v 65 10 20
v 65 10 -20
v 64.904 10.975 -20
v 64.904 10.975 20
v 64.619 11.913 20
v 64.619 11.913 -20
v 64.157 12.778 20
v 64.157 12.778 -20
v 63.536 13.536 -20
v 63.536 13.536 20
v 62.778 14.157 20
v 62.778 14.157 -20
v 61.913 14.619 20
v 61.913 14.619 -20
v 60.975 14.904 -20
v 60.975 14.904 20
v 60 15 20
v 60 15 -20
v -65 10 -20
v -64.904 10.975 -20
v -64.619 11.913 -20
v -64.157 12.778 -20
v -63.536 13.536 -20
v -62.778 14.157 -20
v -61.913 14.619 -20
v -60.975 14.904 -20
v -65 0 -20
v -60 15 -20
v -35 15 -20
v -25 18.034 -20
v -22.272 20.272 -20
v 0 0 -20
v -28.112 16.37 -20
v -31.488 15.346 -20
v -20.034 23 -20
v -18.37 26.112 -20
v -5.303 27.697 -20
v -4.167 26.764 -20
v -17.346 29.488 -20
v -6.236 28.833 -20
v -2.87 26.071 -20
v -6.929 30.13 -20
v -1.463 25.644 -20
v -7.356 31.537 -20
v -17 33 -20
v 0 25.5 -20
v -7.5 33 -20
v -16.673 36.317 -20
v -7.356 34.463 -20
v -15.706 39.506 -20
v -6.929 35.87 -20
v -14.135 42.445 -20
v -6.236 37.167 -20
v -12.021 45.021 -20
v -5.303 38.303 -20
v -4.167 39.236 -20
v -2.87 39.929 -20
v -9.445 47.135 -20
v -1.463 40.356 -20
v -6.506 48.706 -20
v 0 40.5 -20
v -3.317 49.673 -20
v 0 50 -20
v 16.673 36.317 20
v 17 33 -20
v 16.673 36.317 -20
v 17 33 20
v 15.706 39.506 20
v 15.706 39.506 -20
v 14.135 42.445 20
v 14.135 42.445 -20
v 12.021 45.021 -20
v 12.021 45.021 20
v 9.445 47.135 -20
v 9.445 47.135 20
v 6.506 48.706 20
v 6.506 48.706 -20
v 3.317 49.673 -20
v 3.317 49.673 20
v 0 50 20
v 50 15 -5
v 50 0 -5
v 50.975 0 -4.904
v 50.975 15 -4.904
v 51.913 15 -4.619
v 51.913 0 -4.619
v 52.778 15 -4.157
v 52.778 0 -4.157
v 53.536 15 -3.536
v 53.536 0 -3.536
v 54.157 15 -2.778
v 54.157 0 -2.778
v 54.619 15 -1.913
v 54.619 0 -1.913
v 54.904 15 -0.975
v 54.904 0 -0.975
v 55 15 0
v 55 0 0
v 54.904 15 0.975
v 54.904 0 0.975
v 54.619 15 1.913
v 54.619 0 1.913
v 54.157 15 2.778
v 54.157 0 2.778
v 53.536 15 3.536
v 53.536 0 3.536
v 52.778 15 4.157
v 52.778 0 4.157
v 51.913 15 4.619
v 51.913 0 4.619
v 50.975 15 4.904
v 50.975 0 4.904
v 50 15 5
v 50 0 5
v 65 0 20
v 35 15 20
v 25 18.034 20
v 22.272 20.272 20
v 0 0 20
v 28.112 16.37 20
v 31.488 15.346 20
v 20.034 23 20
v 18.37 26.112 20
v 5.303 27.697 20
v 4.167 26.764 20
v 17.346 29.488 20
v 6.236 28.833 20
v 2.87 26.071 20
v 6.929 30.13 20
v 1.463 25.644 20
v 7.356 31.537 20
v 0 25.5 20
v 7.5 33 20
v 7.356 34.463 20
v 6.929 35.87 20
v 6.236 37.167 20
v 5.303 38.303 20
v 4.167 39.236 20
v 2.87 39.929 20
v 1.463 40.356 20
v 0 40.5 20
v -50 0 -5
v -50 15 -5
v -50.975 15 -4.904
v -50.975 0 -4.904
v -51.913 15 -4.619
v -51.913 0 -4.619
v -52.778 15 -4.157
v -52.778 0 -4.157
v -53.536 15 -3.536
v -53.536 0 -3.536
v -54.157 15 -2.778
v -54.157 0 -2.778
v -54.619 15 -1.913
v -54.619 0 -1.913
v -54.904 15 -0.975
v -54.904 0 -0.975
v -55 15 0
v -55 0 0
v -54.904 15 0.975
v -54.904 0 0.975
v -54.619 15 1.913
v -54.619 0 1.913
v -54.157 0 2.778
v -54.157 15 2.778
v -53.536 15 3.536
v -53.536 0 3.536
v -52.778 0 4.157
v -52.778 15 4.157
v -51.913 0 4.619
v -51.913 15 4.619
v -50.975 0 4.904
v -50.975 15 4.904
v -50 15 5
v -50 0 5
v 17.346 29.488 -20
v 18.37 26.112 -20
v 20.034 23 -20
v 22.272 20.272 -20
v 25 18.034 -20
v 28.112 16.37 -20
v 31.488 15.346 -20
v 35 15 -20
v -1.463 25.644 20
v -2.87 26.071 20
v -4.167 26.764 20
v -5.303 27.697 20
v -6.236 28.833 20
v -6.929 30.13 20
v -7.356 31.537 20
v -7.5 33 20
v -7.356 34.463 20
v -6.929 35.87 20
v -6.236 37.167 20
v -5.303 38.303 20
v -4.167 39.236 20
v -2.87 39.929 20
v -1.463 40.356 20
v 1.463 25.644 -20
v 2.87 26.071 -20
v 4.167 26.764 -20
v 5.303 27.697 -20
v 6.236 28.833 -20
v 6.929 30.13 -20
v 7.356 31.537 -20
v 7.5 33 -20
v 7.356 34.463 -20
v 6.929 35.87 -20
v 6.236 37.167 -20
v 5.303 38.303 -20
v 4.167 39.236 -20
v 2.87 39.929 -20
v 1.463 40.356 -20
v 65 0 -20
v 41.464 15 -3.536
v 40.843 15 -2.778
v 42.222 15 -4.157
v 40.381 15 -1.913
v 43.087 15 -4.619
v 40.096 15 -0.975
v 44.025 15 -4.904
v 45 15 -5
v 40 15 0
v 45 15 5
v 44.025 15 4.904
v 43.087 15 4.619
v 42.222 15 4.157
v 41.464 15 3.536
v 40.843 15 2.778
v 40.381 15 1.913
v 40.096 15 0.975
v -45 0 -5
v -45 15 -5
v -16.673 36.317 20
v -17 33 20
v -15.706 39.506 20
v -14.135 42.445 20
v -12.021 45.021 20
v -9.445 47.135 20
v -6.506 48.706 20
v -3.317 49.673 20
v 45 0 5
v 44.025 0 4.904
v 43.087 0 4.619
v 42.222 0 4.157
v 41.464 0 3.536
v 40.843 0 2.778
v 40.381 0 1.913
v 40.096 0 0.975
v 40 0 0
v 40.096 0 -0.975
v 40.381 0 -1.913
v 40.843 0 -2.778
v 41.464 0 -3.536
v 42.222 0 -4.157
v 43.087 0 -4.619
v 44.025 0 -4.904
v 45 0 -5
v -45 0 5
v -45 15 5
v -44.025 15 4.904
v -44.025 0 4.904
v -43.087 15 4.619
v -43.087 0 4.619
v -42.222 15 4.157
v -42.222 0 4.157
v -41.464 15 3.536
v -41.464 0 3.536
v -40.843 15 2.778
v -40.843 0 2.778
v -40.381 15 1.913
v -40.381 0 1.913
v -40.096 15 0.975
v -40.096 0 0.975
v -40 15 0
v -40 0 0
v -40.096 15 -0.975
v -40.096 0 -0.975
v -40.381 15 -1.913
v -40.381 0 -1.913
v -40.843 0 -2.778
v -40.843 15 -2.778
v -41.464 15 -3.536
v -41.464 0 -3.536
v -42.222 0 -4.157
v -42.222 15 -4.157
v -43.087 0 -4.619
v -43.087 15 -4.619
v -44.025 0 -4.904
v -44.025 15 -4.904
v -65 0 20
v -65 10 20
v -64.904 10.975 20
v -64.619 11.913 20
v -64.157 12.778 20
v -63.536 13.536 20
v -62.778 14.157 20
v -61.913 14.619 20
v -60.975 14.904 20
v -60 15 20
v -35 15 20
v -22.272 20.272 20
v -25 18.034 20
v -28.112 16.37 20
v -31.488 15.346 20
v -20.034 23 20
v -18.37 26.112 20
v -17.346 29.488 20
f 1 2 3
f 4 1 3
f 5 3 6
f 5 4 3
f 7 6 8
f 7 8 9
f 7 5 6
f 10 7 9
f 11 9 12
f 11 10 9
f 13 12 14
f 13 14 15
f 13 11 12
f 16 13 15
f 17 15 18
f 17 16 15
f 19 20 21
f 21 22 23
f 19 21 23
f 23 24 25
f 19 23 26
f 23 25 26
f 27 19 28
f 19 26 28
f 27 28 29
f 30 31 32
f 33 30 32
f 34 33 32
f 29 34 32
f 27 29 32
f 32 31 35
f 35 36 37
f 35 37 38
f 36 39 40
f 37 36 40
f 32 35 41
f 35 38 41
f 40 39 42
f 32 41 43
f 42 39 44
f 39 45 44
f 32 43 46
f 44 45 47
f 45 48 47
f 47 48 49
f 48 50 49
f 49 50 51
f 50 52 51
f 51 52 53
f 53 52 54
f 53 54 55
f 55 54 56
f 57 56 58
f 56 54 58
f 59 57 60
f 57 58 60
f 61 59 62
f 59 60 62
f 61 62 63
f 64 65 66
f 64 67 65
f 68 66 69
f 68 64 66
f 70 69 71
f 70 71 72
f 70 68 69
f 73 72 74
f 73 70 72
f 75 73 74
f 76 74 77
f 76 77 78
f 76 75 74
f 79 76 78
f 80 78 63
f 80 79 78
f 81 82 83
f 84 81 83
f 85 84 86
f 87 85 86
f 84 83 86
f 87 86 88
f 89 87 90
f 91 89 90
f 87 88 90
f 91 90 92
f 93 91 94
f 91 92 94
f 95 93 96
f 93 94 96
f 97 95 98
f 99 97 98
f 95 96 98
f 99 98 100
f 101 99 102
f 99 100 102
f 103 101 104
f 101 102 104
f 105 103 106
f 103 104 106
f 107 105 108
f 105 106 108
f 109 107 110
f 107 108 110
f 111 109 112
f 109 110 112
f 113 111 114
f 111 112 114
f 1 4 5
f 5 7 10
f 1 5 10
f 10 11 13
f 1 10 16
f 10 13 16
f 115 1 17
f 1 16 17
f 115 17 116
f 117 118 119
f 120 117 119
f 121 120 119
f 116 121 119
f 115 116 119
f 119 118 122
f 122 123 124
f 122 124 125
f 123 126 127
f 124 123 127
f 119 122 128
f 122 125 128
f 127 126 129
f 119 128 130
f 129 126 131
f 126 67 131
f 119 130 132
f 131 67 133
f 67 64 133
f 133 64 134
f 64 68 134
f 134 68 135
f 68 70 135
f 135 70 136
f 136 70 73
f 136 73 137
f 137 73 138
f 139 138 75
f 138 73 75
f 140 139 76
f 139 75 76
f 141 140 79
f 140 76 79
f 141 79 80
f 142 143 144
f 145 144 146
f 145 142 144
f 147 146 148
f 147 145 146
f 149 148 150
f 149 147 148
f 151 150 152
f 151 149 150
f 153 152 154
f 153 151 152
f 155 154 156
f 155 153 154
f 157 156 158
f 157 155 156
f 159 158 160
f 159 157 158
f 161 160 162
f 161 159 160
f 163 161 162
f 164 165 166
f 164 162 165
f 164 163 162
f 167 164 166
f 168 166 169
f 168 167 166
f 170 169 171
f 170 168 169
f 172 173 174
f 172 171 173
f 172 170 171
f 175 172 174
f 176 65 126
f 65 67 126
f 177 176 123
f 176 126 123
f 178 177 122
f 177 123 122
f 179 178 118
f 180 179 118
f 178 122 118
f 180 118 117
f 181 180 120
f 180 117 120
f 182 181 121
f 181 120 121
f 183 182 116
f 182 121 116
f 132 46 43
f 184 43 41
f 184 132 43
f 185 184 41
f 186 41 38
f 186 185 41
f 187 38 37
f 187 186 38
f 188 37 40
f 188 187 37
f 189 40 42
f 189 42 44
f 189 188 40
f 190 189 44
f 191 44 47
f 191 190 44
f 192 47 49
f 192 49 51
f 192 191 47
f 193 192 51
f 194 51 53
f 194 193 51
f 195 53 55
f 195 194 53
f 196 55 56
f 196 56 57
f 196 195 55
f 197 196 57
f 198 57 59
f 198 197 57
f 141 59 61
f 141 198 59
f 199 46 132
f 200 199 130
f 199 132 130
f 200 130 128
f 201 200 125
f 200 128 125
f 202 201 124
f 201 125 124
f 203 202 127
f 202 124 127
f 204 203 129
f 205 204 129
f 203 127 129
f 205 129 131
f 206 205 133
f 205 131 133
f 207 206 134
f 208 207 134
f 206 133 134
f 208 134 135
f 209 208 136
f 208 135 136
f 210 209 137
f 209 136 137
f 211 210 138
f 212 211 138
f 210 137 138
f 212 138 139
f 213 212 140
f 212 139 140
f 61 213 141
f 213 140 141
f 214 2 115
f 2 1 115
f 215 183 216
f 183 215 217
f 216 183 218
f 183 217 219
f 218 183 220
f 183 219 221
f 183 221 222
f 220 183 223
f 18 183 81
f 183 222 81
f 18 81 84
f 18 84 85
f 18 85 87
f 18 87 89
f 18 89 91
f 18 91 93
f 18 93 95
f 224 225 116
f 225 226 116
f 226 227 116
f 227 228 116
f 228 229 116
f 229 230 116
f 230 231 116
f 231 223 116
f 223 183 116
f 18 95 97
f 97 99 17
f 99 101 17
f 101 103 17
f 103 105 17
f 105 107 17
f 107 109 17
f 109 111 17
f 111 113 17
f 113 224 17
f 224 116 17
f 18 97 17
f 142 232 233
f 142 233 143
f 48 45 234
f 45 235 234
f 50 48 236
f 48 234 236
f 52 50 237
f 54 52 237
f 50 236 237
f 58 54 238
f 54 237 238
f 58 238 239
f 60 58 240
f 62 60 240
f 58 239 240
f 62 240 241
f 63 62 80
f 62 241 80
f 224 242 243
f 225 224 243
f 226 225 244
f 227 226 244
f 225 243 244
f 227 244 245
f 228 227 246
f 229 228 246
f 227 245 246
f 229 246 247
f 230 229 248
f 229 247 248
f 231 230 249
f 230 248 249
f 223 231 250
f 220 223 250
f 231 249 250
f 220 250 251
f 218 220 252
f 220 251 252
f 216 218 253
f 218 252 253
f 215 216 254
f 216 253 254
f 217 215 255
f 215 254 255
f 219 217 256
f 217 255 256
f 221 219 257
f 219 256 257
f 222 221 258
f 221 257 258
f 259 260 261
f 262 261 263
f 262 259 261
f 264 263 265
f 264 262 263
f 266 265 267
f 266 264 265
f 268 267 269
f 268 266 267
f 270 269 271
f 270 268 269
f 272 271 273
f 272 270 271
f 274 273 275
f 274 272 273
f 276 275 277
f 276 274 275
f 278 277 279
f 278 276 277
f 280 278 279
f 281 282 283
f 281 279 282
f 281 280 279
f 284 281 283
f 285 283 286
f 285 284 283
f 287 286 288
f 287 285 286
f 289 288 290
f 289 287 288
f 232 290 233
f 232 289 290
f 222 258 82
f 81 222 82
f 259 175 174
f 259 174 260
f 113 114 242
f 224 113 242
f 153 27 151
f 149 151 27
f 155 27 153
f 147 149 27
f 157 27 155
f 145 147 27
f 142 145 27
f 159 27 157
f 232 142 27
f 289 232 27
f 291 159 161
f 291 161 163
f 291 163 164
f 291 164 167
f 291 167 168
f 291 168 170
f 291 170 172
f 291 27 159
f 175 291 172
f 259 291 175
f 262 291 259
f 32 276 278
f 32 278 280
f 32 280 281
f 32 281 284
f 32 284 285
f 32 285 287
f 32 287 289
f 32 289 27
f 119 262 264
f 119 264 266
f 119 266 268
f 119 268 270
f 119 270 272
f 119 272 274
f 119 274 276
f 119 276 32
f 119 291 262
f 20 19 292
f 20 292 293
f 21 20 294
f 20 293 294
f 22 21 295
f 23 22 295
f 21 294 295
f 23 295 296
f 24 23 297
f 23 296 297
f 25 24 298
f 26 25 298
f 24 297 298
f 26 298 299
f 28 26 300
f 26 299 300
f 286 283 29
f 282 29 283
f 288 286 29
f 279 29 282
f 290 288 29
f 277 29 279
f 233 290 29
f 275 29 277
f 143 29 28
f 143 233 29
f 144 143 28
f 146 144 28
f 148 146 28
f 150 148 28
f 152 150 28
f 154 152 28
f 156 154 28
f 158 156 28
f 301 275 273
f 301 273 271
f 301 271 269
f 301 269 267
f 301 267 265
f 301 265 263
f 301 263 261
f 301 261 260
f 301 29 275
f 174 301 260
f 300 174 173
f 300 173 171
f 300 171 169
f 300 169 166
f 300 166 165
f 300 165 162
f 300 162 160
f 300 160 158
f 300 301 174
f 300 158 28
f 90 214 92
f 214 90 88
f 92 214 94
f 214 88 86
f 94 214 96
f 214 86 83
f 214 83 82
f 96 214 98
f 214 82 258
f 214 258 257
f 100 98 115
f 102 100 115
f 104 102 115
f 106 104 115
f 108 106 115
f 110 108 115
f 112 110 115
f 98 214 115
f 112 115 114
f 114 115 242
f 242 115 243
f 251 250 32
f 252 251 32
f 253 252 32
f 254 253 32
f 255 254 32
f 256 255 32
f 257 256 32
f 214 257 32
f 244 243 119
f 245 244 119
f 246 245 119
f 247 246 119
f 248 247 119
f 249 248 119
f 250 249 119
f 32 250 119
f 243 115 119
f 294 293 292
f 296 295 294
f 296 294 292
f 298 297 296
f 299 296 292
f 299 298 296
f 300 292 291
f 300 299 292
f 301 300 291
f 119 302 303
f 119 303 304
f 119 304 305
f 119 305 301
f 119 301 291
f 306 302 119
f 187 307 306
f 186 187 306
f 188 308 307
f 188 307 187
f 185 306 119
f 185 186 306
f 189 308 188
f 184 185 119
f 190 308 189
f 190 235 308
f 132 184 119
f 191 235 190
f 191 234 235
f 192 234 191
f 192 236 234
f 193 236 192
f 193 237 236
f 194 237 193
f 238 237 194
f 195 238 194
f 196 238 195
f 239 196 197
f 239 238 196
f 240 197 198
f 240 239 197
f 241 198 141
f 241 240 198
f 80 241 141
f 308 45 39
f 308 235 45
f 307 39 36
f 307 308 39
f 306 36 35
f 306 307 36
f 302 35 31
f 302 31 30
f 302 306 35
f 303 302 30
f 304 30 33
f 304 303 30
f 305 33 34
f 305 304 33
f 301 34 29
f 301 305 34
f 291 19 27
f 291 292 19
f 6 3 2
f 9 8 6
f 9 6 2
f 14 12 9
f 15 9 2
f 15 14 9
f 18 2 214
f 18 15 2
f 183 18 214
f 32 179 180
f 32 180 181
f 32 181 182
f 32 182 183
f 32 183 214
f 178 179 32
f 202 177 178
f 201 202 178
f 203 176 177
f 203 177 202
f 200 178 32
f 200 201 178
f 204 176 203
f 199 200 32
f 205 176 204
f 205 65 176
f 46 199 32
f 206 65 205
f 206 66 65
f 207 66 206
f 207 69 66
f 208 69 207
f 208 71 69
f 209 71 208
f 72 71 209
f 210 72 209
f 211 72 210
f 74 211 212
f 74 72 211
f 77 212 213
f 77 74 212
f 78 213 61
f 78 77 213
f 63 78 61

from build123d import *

# Parameters (mm, degrees)
PAD_DEPTH    = 20
POCKET_DEPTH = 232.483876


with BuildPart() as part:
    # Sketch → Pad (new body, symmetric)
    with BuildSketch(Plane.XY):
        with BuildLine():
            ThreePointArc((0, 25.5), (7.5, 33), (0, 40.5))
            Line((0, 40.5), (0, 50))
            ThreePointArc((17, 33), (12.020815, 45.020815), (0, 50))
            ThreePointArc((17, 33), (22.272078, 20.272078), (35, 15))
            Line((35, 15), (47.5, 15))
            Line((47.5, 15), (60, 15))
            ThreePointArc((65, 10), (63.535534, 13.535534), (60, 15))
            Line((65, 10), (65, 0))
            Line((65, 0), (0, 0))
            Line((0, 0), (0, 25.5))
        make_face()
    pad = extrude(amount=PAD_DEPTH, both=True)

    # Sketch001 → Pocket (cut, through all)
    with BuildSketch(Plane.XZ):
        with BuildLine():
            ThreePointArc((50, -5), (55, 0), (50, 5))
            Line((50, 5), (45, 5))
            ThreePointArc((45, 5), (40, 0), (45, -5))
            Line((45, -5), (50, -5))
        make_face()
    pocket = extrude(amount=-POCKET_DEPTH, mode=Mode.SUBTRACT)

    # Mirrored: Pad, Pocket across Sketch V_Axis
    add(pad.mirror(Plane(origin=(0, 0, 0), x_dir=(0, 0, 1), z_dir=(1, 0, 0))))
    add(pocket.mirror(Plane(origin=(0, 0, 0), x_dir=(0, 0, 1), z_dir=(1, 0, 0))), mode=Mode.SUBTRACT)


solid = part.part
